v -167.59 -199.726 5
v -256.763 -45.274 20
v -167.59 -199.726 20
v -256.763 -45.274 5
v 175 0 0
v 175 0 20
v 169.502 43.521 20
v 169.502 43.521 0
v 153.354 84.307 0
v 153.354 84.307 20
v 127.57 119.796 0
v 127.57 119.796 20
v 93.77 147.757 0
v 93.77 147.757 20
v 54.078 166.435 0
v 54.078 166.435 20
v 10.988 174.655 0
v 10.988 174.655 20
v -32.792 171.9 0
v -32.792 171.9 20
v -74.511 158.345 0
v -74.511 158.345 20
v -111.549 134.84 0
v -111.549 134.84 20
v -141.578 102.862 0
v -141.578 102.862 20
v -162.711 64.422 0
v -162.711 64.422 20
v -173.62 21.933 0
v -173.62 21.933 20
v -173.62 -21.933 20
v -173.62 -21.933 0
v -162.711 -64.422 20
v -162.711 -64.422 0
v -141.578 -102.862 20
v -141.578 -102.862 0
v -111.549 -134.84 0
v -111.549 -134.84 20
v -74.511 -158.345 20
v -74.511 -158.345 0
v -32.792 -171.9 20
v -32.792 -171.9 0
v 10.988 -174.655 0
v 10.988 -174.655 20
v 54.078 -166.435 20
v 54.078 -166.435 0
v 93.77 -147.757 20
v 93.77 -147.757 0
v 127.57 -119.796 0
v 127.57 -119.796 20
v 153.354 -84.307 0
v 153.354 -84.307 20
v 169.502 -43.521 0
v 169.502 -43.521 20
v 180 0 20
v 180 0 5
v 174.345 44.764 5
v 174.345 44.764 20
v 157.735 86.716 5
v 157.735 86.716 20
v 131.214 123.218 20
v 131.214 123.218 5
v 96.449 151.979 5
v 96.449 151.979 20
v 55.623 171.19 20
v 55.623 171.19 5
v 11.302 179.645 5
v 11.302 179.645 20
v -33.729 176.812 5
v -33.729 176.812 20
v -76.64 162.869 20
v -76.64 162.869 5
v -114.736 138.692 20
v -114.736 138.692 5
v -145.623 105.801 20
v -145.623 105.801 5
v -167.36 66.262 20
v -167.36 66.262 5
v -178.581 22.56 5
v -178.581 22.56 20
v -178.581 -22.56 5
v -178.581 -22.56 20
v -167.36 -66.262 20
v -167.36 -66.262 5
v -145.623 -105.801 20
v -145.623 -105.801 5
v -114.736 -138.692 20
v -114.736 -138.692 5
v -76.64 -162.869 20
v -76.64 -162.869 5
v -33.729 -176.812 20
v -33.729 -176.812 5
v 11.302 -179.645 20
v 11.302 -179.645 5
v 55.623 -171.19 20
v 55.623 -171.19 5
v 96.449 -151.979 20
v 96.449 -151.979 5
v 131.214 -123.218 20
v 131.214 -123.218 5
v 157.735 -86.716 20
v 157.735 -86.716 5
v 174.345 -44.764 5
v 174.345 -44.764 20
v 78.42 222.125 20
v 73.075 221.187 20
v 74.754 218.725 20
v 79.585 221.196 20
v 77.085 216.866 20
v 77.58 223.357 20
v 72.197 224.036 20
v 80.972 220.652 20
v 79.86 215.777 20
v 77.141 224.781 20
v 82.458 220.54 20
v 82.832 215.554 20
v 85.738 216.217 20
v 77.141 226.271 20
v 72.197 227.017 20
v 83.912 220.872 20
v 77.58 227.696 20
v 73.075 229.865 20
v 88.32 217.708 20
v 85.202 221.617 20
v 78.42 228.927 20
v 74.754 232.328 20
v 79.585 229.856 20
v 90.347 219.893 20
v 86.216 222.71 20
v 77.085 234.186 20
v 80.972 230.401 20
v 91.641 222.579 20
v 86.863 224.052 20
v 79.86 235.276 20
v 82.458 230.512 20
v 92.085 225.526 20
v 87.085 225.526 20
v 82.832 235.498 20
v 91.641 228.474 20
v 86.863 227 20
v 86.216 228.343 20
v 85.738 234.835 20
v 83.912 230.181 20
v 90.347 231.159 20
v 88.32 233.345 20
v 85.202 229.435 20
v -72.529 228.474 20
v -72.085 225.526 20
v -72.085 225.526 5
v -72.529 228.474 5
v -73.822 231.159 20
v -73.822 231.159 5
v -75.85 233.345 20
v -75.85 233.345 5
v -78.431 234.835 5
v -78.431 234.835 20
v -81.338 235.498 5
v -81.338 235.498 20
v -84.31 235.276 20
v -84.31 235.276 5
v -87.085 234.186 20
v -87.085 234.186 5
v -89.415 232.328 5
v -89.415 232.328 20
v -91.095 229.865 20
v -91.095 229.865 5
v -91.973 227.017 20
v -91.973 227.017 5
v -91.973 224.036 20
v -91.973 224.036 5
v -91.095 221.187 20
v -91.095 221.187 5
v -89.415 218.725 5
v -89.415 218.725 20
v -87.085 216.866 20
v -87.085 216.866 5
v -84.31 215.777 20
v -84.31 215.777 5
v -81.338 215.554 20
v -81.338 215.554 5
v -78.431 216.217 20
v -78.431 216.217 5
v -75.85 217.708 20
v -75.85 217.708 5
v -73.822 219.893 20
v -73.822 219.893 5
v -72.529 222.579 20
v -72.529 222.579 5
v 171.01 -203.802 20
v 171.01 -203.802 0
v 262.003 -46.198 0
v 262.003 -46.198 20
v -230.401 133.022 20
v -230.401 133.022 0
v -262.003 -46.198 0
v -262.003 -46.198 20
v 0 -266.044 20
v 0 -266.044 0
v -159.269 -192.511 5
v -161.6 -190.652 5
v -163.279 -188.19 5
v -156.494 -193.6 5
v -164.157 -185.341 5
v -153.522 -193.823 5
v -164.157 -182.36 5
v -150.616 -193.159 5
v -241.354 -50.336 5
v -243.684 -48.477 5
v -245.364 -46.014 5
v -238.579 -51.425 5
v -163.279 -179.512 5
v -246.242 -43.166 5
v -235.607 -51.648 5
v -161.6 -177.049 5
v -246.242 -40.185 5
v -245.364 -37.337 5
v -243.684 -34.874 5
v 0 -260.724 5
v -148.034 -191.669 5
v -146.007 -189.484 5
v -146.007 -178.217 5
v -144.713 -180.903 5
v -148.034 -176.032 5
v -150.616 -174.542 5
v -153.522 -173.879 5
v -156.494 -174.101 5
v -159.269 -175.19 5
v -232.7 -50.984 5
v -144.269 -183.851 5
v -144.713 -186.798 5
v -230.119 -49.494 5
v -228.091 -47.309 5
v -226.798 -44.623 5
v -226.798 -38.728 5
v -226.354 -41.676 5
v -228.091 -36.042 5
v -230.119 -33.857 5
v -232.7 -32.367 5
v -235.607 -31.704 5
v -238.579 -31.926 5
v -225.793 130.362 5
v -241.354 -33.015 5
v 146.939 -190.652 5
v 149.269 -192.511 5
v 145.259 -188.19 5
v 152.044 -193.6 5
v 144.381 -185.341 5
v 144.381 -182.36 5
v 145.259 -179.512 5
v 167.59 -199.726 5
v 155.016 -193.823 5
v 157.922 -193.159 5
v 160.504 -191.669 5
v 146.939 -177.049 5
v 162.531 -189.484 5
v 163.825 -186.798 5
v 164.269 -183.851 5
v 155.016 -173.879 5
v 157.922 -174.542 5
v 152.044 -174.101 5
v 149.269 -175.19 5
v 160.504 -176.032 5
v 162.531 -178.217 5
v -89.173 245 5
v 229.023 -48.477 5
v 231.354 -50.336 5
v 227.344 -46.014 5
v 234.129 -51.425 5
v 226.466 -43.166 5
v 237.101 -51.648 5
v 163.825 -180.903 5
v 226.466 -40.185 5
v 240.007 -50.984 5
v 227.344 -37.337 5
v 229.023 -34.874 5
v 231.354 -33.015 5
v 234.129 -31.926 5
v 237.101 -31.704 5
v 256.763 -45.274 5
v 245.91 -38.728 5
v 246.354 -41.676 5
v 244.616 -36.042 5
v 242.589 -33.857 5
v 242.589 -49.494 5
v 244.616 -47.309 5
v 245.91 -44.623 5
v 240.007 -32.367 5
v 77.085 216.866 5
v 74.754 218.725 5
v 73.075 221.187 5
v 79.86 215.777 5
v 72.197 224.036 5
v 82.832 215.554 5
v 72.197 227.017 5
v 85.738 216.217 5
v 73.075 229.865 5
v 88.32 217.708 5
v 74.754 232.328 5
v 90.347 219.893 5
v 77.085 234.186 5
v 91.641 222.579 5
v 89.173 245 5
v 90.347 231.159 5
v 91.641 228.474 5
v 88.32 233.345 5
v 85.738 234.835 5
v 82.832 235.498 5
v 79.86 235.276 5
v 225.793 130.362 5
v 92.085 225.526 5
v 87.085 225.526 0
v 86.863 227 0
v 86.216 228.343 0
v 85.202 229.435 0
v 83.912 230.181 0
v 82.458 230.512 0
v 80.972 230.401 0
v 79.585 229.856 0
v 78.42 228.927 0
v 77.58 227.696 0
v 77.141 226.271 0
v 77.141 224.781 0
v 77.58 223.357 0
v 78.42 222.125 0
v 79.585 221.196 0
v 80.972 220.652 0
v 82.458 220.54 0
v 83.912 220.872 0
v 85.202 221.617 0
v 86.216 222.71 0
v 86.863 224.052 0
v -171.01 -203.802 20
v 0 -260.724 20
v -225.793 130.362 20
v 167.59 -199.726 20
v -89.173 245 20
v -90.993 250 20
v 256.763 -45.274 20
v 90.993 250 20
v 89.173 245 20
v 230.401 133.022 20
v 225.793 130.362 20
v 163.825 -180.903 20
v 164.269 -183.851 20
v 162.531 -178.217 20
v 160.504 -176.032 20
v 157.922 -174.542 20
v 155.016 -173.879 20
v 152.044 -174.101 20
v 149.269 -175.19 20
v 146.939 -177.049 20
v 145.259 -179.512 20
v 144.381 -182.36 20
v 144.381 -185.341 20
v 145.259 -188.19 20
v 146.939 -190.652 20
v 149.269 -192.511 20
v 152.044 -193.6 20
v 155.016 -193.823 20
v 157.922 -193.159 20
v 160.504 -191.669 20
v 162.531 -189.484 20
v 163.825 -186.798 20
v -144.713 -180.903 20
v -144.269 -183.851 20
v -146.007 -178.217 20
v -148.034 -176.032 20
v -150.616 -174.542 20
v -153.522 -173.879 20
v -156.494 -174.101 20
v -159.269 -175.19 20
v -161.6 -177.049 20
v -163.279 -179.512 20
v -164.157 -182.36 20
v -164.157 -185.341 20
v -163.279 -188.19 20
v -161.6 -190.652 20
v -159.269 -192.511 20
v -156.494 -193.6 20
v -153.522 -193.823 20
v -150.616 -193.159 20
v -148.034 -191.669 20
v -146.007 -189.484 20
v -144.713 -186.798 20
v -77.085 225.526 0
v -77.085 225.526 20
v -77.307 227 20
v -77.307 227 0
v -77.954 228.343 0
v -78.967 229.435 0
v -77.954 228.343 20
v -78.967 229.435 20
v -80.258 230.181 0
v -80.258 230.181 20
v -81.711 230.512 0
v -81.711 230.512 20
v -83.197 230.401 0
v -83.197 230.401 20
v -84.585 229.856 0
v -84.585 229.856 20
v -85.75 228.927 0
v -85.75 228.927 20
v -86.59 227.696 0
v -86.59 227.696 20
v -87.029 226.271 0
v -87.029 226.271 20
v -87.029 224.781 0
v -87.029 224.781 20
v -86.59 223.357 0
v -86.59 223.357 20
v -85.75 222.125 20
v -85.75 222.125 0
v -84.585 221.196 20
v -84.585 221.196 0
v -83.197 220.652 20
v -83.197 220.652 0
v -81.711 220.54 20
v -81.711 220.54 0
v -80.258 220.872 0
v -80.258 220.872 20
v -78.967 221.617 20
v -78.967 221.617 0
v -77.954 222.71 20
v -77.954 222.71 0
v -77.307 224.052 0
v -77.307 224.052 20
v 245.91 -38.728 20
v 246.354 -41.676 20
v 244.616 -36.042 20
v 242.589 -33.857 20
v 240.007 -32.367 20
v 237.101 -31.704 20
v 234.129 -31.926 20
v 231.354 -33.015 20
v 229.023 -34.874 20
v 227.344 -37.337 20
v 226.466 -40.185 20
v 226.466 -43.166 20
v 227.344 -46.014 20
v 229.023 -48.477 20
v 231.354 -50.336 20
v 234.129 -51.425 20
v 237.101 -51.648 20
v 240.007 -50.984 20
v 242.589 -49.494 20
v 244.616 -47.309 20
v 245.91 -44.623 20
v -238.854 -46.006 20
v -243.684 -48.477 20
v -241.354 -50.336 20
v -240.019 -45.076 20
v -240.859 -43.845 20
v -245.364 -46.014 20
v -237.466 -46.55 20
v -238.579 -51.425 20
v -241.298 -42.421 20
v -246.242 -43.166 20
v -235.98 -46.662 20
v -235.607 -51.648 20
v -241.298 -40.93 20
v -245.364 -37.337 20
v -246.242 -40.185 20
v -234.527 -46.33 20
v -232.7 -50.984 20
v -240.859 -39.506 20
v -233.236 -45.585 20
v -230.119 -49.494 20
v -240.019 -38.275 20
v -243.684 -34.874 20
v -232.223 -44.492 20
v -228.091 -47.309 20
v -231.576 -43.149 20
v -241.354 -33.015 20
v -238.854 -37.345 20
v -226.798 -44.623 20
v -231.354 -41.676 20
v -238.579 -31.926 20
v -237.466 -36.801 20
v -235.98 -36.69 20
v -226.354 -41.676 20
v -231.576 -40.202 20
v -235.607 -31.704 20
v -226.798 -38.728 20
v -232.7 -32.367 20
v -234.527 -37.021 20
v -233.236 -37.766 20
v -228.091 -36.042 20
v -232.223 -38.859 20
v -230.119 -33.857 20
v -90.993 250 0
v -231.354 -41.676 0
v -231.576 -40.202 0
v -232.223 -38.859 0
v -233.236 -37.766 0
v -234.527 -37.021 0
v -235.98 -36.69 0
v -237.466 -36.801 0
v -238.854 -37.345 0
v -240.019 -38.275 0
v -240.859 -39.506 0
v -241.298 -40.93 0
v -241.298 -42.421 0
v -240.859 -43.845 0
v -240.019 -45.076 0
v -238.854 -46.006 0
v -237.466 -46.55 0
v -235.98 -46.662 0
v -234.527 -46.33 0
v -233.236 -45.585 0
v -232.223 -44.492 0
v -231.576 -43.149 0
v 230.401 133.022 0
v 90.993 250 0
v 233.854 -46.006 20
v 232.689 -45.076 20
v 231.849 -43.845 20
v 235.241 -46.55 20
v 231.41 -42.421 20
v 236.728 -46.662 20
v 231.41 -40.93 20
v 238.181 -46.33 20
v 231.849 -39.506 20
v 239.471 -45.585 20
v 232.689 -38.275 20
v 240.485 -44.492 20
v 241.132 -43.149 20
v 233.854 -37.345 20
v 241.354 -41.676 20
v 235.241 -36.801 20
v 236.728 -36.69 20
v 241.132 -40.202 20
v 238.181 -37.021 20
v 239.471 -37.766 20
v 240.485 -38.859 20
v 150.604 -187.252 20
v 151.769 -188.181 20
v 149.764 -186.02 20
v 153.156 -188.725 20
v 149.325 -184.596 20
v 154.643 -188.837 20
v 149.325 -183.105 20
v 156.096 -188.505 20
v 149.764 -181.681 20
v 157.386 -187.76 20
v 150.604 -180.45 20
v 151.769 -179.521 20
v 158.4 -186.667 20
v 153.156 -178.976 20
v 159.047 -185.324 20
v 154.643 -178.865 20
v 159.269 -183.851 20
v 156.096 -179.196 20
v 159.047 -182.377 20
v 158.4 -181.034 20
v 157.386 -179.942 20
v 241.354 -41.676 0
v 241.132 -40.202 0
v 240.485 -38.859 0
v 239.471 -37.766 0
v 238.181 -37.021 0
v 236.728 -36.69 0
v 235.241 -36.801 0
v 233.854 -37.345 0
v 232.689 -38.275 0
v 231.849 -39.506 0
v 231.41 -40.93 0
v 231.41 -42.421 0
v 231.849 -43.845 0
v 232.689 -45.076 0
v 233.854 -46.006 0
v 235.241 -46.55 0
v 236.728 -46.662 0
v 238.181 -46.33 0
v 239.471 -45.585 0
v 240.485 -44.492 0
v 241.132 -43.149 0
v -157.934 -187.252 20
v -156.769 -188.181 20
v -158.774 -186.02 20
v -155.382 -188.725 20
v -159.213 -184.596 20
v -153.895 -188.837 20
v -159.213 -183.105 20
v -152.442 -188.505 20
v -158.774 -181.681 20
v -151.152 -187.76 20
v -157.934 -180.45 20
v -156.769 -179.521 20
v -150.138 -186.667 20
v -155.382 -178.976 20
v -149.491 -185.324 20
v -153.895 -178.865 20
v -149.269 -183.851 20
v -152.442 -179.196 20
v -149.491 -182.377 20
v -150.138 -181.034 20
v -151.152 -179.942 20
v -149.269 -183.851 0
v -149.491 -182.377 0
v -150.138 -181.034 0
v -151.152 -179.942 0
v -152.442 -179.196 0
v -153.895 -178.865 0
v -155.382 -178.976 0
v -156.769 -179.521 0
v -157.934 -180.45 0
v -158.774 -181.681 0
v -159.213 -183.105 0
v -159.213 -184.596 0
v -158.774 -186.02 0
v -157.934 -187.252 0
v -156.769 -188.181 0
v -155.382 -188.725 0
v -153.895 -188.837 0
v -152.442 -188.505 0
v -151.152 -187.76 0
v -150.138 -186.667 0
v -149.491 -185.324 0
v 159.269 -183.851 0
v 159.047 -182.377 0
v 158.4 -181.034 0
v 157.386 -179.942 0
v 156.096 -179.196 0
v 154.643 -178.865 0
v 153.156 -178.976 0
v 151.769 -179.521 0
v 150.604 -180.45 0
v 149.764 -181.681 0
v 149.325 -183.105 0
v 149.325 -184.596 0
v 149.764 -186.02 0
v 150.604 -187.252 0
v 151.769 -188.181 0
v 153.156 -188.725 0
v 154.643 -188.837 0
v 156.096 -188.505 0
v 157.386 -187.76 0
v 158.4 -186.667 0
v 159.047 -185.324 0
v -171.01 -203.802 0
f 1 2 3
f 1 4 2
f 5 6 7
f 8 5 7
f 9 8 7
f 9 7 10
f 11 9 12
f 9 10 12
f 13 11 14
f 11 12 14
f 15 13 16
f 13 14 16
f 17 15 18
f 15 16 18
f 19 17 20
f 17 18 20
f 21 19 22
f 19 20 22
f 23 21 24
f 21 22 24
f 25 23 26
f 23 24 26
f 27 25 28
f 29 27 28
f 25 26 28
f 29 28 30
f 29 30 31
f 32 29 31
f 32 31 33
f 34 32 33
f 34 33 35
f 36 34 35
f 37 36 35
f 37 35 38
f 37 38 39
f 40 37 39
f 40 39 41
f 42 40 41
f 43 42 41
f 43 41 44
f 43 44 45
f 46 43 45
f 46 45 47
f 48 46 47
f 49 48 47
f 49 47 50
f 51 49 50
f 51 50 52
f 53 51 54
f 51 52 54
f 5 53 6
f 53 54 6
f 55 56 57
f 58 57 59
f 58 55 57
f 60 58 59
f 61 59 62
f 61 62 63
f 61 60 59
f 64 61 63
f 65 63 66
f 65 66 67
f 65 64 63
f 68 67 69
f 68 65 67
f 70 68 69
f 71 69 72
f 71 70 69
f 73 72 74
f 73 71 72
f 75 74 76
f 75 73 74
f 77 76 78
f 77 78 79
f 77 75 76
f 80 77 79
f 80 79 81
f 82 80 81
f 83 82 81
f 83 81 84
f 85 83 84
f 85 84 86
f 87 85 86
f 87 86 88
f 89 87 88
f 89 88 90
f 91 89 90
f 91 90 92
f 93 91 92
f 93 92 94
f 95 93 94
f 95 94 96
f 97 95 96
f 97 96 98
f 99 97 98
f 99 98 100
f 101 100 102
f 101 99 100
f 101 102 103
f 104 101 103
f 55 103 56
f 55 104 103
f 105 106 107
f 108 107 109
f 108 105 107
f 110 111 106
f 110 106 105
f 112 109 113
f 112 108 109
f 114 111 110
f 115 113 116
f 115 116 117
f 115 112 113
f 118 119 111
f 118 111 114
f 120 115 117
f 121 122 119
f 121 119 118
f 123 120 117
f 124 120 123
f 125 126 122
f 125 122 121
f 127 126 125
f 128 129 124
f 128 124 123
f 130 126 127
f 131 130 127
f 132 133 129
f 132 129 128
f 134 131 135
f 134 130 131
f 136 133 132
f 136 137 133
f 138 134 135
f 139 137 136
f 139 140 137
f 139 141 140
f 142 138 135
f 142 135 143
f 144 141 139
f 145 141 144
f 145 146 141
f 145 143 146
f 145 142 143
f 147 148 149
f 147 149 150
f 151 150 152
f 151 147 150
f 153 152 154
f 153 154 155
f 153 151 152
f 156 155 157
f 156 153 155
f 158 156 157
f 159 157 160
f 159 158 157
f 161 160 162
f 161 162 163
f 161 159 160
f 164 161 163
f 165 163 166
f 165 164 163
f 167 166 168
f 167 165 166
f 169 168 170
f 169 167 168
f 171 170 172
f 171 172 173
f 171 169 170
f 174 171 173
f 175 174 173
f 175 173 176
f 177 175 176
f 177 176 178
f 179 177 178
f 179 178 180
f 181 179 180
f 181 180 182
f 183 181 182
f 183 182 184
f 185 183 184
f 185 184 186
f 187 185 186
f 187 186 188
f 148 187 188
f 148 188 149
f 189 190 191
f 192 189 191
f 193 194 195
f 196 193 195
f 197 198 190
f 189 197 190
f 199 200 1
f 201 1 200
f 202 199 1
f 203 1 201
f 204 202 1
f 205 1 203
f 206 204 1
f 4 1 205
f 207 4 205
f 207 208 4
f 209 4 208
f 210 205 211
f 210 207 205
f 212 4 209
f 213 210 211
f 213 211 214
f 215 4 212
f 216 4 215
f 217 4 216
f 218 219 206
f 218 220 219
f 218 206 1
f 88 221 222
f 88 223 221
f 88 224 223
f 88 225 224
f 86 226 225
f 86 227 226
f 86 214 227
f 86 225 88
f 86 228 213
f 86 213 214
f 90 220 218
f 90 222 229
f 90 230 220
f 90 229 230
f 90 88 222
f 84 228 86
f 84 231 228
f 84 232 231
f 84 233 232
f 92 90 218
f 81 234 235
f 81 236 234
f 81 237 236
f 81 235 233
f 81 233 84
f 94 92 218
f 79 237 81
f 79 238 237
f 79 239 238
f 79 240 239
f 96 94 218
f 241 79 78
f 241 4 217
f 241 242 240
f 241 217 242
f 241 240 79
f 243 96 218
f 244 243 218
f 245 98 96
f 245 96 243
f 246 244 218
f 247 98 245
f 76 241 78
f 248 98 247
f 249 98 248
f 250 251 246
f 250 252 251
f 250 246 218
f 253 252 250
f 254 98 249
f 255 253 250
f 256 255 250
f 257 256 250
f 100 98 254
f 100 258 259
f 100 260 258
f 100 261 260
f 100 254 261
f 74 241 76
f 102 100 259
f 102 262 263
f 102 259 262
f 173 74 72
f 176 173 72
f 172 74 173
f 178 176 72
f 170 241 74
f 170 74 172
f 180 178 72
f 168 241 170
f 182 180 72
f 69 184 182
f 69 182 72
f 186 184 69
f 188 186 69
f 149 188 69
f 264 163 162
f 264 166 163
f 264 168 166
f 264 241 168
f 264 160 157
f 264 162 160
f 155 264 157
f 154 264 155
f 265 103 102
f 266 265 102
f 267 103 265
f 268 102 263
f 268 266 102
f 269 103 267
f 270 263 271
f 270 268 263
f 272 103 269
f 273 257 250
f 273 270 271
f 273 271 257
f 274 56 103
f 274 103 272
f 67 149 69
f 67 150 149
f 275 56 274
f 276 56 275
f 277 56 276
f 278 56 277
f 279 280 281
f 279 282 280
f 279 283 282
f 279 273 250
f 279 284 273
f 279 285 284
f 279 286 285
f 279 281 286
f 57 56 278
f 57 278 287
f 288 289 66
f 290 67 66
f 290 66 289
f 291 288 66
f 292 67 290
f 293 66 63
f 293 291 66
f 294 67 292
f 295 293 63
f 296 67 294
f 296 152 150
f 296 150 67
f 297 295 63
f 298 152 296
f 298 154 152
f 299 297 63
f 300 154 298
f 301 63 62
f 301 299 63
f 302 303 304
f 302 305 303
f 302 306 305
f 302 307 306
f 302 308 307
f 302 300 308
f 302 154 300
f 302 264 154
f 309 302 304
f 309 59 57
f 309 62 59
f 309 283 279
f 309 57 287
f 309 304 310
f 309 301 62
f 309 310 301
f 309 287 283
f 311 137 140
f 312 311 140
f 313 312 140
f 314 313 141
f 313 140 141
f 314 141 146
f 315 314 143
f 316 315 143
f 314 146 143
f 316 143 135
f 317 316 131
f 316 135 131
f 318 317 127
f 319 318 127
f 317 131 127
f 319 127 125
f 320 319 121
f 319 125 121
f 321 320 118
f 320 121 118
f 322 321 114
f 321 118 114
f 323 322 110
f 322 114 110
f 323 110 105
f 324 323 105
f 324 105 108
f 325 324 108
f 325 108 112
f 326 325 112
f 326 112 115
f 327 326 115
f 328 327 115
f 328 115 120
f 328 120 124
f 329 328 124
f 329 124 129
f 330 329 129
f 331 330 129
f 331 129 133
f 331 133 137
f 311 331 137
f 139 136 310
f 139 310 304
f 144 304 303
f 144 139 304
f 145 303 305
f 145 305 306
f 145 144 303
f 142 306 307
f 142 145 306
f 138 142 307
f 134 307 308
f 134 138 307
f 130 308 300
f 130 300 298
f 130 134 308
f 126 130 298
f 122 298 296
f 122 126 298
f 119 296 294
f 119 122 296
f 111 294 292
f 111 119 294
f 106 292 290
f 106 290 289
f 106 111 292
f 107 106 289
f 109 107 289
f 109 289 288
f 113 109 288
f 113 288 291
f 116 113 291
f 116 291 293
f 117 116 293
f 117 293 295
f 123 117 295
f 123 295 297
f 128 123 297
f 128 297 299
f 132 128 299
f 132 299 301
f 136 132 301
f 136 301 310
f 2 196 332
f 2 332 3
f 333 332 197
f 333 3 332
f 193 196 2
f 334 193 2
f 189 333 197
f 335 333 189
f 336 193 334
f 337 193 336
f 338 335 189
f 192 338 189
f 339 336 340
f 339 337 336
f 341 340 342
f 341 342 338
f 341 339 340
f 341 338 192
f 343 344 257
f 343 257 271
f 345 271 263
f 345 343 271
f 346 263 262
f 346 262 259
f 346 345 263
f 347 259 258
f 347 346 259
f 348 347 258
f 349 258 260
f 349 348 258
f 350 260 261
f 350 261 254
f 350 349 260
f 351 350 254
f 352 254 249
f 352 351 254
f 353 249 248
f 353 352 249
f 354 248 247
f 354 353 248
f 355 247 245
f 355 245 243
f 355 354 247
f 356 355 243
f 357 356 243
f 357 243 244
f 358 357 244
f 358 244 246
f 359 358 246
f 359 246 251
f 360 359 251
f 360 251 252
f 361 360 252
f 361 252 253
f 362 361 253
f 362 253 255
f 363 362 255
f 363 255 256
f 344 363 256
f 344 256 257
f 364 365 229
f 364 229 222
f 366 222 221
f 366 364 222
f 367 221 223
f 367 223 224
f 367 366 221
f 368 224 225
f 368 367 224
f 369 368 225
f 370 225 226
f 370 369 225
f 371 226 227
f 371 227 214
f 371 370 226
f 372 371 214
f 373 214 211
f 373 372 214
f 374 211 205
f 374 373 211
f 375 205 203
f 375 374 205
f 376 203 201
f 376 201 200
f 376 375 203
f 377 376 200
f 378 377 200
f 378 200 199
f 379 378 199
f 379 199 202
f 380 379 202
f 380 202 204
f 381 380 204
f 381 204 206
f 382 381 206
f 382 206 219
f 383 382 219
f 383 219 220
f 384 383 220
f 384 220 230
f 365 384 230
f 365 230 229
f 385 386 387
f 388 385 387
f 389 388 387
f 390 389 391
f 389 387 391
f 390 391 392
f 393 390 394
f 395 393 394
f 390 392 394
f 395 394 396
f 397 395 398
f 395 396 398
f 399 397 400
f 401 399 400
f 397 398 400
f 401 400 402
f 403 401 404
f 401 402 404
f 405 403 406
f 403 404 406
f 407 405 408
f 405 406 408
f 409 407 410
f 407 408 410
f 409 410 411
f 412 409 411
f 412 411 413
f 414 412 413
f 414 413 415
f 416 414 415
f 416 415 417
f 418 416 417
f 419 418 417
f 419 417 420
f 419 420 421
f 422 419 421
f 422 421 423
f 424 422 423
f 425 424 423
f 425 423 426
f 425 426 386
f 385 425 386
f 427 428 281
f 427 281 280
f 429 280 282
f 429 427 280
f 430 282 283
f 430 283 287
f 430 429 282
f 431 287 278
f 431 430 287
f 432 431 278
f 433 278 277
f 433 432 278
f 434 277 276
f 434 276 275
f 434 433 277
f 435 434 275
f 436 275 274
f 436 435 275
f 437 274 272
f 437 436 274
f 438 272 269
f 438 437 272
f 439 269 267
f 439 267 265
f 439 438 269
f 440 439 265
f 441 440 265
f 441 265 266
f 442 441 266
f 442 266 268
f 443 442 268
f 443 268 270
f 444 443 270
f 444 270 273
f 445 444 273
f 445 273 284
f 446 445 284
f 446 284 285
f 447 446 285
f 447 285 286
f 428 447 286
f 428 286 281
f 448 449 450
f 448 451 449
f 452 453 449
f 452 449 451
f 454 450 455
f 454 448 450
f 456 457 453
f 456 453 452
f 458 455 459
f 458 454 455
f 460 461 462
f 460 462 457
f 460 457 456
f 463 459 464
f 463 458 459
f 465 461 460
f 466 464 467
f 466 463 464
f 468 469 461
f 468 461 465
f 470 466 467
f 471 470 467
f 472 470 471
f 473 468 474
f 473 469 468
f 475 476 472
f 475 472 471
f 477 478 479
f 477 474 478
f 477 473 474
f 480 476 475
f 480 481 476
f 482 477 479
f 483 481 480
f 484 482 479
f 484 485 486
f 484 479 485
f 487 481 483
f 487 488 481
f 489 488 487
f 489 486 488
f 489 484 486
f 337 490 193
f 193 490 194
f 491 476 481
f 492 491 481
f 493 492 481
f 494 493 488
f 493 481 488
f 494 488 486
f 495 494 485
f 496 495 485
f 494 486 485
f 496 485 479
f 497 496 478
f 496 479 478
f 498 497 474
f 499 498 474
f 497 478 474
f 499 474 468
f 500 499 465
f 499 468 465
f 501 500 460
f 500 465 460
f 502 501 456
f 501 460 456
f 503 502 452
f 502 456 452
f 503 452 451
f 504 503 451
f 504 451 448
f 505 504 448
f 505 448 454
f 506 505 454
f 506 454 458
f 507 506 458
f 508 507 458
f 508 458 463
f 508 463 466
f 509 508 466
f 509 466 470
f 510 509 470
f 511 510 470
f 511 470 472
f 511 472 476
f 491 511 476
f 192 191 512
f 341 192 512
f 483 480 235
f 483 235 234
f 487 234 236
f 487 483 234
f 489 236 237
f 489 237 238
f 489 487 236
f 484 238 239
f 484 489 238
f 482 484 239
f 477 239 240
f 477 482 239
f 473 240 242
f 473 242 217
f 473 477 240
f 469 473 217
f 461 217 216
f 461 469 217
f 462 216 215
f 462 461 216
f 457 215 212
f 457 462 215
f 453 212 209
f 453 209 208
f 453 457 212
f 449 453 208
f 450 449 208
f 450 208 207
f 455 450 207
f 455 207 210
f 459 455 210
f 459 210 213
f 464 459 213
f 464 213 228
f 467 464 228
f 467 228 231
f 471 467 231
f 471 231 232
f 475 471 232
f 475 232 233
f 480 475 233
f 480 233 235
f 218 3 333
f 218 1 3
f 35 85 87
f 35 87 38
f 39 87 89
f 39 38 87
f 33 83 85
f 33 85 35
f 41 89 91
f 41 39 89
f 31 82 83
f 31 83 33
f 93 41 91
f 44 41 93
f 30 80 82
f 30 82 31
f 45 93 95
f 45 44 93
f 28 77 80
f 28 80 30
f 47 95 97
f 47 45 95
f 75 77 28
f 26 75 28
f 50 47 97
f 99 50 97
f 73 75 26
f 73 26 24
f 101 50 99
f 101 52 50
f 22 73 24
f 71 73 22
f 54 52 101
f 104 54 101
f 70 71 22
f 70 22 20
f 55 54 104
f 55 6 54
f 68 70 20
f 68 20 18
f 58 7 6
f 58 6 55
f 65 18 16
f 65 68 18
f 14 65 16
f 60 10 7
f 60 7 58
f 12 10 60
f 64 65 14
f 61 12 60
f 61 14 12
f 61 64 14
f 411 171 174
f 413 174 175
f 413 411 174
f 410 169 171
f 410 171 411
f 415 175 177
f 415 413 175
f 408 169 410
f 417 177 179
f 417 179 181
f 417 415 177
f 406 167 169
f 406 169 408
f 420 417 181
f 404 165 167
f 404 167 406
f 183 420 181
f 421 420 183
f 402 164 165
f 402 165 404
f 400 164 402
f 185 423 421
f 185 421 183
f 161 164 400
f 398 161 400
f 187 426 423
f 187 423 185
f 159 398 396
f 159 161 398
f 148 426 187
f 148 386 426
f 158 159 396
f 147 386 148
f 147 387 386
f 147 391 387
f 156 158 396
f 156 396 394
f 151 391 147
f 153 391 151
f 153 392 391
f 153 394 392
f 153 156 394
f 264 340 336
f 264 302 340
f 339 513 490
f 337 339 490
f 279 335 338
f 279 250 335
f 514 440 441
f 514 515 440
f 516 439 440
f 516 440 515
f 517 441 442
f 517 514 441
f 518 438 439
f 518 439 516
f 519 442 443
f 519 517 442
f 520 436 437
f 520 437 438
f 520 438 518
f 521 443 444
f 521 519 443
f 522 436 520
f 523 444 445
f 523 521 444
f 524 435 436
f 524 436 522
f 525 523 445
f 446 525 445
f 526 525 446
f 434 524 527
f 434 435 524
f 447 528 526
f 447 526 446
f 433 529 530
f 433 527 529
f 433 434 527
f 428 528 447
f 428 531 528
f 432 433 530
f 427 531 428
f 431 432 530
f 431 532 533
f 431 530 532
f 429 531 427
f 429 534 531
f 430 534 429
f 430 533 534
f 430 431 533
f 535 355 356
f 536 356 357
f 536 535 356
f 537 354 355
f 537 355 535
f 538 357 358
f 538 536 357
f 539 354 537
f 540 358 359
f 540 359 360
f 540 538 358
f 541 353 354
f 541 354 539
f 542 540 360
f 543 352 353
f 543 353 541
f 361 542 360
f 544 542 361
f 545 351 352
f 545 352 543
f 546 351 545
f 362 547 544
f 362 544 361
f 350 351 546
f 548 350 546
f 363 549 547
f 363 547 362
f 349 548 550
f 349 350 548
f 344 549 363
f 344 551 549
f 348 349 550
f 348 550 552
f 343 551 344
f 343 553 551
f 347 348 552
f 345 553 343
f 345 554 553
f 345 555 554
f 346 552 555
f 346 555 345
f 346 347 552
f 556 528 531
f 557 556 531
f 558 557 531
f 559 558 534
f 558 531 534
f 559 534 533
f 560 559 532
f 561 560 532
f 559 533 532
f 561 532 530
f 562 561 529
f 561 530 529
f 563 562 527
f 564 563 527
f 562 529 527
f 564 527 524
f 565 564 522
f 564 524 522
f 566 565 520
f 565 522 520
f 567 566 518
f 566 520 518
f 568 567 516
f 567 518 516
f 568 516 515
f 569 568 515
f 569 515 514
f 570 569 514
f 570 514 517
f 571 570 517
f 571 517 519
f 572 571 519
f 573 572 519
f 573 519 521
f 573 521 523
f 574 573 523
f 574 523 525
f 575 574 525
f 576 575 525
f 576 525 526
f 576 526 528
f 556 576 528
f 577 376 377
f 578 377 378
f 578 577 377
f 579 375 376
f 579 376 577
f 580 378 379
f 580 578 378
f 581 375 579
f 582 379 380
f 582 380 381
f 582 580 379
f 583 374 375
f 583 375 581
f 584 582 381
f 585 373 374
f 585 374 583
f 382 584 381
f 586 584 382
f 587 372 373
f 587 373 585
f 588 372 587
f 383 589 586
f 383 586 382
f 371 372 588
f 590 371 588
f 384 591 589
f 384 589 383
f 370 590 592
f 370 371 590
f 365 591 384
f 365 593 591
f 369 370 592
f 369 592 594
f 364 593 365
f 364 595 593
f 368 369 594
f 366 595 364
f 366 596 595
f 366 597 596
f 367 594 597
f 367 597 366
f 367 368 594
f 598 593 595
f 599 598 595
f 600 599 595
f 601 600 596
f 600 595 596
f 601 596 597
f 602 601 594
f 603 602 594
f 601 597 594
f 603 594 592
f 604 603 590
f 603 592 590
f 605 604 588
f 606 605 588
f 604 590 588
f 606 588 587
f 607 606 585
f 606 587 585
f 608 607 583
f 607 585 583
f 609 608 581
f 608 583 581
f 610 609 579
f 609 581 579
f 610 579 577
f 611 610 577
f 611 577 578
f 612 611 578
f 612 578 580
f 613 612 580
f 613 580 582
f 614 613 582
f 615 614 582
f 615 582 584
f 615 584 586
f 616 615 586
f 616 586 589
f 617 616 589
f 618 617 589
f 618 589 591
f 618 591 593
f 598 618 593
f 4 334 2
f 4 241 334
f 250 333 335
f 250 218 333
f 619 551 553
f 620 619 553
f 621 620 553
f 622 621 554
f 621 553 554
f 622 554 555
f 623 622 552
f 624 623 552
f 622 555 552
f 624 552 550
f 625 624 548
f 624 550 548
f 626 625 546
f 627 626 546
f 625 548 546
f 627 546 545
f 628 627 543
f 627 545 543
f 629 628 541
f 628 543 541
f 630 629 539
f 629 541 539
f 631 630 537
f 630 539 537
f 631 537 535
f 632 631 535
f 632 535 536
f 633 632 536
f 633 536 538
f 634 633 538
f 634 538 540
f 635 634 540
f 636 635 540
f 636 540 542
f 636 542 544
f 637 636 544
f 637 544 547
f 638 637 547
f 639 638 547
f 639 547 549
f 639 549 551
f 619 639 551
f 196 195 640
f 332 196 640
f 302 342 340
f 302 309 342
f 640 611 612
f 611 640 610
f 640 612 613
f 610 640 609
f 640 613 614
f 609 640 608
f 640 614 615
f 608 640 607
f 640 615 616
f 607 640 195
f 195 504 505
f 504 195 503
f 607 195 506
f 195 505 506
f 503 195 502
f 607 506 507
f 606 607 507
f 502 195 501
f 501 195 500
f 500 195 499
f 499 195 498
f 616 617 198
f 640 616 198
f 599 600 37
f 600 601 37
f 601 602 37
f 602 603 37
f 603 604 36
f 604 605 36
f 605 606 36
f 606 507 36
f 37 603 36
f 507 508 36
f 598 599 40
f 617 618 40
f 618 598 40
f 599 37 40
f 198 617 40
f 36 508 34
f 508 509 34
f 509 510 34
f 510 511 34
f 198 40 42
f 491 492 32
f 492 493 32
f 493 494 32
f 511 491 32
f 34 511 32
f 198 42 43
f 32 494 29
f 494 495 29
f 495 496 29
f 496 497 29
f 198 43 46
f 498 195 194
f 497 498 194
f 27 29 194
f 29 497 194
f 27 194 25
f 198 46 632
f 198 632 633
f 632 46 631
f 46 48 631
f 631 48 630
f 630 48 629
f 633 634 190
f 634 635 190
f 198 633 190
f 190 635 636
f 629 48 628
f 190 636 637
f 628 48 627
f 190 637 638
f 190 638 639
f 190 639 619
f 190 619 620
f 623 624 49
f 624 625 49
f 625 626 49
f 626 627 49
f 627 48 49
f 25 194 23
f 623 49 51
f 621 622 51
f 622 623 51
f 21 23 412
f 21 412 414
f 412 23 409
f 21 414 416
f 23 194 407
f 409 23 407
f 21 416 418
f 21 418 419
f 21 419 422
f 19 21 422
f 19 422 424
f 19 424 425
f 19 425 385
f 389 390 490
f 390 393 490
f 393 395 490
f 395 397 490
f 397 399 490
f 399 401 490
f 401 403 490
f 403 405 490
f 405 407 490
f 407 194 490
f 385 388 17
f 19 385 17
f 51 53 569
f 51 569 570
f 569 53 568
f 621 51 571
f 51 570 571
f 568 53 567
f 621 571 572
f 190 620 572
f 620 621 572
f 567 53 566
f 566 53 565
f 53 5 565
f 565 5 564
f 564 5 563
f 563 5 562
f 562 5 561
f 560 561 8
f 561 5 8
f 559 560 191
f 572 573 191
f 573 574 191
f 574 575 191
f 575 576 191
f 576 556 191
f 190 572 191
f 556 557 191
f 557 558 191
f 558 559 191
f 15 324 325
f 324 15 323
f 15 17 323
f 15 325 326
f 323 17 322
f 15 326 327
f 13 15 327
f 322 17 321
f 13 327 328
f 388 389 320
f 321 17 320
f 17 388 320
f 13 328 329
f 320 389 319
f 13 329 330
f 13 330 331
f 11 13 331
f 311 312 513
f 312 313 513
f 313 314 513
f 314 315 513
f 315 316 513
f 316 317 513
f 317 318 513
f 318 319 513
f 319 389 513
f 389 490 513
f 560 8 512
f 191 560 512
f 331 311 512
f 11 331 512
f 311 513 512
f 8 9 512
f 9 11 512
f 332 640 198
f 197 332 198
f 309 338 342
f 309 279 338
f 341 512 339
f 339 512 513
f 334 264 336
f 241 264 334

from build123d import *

# Parameters (mm, degrees)
F1_DEPTH = 20
F2_R     = 175
F3_DEPTH = 20.001
F4_R     = 5
F5_DEPTH = 20.001
F6_T     = -5


with BuildPart() as f1:
    # F0 (on Top) → F1 (new body)
    with BuildSketch(Plane.XY):
        Polygon((90.9925585666, 250), (-90.9925585666, 250), (-230.4012462767, 133.0222215595), (-262.0026302294, -46.198132726), (-171.0100716628, -203.801867274), (0, -266.044443119), (171.0100716628, -203.801867274), (262.0026302294, -46.198132726), (230.4012462767, 133.0222215595), align=None)
    extrude(amount=F1_DEPTH)

    # F2 (on face) → F3 (cut, through all)
    with BuildSketch(Plane.XY.offset(20)):
        Circle(F2_R)
    extrude(amount=-F3_DEPTH, mode=Mode.SUBTRACT)

    # F4 (on face) → F5 (cut, through all)
    with BuildSketch(Plane.XY.offset(20)):
        with Locations((-154.2690263248, -183.8506663486)):
            Circle(F4_R)
        with Locations((236.3538607229, -41.6755626401)):
            Circle(F4_R)
        with Locations((82.0848343982, 225.5262289886)):
            Circle(F4_R)
        with Locations((-236.3538607229, -41.6755626401)):
            Circle(F4_R)
        with Locations((154.2690263248, -183.8506663486)):
            Circle(F4_R)
        with Locations((-82.0848343982, 225.5262289886)):
            Circle(F4_R)
    extrude(amount=-F5_DEPTH, mode=Mode.SUBTRACT)

    # F6
    f6_openings = [f1.faces().sort_by_distance(p)[0] for p in [
        (155.969535, 185.877254, 20),
    ]]
    offset(amount=F6_T, openings=f6_openings)


solid = f1.part
